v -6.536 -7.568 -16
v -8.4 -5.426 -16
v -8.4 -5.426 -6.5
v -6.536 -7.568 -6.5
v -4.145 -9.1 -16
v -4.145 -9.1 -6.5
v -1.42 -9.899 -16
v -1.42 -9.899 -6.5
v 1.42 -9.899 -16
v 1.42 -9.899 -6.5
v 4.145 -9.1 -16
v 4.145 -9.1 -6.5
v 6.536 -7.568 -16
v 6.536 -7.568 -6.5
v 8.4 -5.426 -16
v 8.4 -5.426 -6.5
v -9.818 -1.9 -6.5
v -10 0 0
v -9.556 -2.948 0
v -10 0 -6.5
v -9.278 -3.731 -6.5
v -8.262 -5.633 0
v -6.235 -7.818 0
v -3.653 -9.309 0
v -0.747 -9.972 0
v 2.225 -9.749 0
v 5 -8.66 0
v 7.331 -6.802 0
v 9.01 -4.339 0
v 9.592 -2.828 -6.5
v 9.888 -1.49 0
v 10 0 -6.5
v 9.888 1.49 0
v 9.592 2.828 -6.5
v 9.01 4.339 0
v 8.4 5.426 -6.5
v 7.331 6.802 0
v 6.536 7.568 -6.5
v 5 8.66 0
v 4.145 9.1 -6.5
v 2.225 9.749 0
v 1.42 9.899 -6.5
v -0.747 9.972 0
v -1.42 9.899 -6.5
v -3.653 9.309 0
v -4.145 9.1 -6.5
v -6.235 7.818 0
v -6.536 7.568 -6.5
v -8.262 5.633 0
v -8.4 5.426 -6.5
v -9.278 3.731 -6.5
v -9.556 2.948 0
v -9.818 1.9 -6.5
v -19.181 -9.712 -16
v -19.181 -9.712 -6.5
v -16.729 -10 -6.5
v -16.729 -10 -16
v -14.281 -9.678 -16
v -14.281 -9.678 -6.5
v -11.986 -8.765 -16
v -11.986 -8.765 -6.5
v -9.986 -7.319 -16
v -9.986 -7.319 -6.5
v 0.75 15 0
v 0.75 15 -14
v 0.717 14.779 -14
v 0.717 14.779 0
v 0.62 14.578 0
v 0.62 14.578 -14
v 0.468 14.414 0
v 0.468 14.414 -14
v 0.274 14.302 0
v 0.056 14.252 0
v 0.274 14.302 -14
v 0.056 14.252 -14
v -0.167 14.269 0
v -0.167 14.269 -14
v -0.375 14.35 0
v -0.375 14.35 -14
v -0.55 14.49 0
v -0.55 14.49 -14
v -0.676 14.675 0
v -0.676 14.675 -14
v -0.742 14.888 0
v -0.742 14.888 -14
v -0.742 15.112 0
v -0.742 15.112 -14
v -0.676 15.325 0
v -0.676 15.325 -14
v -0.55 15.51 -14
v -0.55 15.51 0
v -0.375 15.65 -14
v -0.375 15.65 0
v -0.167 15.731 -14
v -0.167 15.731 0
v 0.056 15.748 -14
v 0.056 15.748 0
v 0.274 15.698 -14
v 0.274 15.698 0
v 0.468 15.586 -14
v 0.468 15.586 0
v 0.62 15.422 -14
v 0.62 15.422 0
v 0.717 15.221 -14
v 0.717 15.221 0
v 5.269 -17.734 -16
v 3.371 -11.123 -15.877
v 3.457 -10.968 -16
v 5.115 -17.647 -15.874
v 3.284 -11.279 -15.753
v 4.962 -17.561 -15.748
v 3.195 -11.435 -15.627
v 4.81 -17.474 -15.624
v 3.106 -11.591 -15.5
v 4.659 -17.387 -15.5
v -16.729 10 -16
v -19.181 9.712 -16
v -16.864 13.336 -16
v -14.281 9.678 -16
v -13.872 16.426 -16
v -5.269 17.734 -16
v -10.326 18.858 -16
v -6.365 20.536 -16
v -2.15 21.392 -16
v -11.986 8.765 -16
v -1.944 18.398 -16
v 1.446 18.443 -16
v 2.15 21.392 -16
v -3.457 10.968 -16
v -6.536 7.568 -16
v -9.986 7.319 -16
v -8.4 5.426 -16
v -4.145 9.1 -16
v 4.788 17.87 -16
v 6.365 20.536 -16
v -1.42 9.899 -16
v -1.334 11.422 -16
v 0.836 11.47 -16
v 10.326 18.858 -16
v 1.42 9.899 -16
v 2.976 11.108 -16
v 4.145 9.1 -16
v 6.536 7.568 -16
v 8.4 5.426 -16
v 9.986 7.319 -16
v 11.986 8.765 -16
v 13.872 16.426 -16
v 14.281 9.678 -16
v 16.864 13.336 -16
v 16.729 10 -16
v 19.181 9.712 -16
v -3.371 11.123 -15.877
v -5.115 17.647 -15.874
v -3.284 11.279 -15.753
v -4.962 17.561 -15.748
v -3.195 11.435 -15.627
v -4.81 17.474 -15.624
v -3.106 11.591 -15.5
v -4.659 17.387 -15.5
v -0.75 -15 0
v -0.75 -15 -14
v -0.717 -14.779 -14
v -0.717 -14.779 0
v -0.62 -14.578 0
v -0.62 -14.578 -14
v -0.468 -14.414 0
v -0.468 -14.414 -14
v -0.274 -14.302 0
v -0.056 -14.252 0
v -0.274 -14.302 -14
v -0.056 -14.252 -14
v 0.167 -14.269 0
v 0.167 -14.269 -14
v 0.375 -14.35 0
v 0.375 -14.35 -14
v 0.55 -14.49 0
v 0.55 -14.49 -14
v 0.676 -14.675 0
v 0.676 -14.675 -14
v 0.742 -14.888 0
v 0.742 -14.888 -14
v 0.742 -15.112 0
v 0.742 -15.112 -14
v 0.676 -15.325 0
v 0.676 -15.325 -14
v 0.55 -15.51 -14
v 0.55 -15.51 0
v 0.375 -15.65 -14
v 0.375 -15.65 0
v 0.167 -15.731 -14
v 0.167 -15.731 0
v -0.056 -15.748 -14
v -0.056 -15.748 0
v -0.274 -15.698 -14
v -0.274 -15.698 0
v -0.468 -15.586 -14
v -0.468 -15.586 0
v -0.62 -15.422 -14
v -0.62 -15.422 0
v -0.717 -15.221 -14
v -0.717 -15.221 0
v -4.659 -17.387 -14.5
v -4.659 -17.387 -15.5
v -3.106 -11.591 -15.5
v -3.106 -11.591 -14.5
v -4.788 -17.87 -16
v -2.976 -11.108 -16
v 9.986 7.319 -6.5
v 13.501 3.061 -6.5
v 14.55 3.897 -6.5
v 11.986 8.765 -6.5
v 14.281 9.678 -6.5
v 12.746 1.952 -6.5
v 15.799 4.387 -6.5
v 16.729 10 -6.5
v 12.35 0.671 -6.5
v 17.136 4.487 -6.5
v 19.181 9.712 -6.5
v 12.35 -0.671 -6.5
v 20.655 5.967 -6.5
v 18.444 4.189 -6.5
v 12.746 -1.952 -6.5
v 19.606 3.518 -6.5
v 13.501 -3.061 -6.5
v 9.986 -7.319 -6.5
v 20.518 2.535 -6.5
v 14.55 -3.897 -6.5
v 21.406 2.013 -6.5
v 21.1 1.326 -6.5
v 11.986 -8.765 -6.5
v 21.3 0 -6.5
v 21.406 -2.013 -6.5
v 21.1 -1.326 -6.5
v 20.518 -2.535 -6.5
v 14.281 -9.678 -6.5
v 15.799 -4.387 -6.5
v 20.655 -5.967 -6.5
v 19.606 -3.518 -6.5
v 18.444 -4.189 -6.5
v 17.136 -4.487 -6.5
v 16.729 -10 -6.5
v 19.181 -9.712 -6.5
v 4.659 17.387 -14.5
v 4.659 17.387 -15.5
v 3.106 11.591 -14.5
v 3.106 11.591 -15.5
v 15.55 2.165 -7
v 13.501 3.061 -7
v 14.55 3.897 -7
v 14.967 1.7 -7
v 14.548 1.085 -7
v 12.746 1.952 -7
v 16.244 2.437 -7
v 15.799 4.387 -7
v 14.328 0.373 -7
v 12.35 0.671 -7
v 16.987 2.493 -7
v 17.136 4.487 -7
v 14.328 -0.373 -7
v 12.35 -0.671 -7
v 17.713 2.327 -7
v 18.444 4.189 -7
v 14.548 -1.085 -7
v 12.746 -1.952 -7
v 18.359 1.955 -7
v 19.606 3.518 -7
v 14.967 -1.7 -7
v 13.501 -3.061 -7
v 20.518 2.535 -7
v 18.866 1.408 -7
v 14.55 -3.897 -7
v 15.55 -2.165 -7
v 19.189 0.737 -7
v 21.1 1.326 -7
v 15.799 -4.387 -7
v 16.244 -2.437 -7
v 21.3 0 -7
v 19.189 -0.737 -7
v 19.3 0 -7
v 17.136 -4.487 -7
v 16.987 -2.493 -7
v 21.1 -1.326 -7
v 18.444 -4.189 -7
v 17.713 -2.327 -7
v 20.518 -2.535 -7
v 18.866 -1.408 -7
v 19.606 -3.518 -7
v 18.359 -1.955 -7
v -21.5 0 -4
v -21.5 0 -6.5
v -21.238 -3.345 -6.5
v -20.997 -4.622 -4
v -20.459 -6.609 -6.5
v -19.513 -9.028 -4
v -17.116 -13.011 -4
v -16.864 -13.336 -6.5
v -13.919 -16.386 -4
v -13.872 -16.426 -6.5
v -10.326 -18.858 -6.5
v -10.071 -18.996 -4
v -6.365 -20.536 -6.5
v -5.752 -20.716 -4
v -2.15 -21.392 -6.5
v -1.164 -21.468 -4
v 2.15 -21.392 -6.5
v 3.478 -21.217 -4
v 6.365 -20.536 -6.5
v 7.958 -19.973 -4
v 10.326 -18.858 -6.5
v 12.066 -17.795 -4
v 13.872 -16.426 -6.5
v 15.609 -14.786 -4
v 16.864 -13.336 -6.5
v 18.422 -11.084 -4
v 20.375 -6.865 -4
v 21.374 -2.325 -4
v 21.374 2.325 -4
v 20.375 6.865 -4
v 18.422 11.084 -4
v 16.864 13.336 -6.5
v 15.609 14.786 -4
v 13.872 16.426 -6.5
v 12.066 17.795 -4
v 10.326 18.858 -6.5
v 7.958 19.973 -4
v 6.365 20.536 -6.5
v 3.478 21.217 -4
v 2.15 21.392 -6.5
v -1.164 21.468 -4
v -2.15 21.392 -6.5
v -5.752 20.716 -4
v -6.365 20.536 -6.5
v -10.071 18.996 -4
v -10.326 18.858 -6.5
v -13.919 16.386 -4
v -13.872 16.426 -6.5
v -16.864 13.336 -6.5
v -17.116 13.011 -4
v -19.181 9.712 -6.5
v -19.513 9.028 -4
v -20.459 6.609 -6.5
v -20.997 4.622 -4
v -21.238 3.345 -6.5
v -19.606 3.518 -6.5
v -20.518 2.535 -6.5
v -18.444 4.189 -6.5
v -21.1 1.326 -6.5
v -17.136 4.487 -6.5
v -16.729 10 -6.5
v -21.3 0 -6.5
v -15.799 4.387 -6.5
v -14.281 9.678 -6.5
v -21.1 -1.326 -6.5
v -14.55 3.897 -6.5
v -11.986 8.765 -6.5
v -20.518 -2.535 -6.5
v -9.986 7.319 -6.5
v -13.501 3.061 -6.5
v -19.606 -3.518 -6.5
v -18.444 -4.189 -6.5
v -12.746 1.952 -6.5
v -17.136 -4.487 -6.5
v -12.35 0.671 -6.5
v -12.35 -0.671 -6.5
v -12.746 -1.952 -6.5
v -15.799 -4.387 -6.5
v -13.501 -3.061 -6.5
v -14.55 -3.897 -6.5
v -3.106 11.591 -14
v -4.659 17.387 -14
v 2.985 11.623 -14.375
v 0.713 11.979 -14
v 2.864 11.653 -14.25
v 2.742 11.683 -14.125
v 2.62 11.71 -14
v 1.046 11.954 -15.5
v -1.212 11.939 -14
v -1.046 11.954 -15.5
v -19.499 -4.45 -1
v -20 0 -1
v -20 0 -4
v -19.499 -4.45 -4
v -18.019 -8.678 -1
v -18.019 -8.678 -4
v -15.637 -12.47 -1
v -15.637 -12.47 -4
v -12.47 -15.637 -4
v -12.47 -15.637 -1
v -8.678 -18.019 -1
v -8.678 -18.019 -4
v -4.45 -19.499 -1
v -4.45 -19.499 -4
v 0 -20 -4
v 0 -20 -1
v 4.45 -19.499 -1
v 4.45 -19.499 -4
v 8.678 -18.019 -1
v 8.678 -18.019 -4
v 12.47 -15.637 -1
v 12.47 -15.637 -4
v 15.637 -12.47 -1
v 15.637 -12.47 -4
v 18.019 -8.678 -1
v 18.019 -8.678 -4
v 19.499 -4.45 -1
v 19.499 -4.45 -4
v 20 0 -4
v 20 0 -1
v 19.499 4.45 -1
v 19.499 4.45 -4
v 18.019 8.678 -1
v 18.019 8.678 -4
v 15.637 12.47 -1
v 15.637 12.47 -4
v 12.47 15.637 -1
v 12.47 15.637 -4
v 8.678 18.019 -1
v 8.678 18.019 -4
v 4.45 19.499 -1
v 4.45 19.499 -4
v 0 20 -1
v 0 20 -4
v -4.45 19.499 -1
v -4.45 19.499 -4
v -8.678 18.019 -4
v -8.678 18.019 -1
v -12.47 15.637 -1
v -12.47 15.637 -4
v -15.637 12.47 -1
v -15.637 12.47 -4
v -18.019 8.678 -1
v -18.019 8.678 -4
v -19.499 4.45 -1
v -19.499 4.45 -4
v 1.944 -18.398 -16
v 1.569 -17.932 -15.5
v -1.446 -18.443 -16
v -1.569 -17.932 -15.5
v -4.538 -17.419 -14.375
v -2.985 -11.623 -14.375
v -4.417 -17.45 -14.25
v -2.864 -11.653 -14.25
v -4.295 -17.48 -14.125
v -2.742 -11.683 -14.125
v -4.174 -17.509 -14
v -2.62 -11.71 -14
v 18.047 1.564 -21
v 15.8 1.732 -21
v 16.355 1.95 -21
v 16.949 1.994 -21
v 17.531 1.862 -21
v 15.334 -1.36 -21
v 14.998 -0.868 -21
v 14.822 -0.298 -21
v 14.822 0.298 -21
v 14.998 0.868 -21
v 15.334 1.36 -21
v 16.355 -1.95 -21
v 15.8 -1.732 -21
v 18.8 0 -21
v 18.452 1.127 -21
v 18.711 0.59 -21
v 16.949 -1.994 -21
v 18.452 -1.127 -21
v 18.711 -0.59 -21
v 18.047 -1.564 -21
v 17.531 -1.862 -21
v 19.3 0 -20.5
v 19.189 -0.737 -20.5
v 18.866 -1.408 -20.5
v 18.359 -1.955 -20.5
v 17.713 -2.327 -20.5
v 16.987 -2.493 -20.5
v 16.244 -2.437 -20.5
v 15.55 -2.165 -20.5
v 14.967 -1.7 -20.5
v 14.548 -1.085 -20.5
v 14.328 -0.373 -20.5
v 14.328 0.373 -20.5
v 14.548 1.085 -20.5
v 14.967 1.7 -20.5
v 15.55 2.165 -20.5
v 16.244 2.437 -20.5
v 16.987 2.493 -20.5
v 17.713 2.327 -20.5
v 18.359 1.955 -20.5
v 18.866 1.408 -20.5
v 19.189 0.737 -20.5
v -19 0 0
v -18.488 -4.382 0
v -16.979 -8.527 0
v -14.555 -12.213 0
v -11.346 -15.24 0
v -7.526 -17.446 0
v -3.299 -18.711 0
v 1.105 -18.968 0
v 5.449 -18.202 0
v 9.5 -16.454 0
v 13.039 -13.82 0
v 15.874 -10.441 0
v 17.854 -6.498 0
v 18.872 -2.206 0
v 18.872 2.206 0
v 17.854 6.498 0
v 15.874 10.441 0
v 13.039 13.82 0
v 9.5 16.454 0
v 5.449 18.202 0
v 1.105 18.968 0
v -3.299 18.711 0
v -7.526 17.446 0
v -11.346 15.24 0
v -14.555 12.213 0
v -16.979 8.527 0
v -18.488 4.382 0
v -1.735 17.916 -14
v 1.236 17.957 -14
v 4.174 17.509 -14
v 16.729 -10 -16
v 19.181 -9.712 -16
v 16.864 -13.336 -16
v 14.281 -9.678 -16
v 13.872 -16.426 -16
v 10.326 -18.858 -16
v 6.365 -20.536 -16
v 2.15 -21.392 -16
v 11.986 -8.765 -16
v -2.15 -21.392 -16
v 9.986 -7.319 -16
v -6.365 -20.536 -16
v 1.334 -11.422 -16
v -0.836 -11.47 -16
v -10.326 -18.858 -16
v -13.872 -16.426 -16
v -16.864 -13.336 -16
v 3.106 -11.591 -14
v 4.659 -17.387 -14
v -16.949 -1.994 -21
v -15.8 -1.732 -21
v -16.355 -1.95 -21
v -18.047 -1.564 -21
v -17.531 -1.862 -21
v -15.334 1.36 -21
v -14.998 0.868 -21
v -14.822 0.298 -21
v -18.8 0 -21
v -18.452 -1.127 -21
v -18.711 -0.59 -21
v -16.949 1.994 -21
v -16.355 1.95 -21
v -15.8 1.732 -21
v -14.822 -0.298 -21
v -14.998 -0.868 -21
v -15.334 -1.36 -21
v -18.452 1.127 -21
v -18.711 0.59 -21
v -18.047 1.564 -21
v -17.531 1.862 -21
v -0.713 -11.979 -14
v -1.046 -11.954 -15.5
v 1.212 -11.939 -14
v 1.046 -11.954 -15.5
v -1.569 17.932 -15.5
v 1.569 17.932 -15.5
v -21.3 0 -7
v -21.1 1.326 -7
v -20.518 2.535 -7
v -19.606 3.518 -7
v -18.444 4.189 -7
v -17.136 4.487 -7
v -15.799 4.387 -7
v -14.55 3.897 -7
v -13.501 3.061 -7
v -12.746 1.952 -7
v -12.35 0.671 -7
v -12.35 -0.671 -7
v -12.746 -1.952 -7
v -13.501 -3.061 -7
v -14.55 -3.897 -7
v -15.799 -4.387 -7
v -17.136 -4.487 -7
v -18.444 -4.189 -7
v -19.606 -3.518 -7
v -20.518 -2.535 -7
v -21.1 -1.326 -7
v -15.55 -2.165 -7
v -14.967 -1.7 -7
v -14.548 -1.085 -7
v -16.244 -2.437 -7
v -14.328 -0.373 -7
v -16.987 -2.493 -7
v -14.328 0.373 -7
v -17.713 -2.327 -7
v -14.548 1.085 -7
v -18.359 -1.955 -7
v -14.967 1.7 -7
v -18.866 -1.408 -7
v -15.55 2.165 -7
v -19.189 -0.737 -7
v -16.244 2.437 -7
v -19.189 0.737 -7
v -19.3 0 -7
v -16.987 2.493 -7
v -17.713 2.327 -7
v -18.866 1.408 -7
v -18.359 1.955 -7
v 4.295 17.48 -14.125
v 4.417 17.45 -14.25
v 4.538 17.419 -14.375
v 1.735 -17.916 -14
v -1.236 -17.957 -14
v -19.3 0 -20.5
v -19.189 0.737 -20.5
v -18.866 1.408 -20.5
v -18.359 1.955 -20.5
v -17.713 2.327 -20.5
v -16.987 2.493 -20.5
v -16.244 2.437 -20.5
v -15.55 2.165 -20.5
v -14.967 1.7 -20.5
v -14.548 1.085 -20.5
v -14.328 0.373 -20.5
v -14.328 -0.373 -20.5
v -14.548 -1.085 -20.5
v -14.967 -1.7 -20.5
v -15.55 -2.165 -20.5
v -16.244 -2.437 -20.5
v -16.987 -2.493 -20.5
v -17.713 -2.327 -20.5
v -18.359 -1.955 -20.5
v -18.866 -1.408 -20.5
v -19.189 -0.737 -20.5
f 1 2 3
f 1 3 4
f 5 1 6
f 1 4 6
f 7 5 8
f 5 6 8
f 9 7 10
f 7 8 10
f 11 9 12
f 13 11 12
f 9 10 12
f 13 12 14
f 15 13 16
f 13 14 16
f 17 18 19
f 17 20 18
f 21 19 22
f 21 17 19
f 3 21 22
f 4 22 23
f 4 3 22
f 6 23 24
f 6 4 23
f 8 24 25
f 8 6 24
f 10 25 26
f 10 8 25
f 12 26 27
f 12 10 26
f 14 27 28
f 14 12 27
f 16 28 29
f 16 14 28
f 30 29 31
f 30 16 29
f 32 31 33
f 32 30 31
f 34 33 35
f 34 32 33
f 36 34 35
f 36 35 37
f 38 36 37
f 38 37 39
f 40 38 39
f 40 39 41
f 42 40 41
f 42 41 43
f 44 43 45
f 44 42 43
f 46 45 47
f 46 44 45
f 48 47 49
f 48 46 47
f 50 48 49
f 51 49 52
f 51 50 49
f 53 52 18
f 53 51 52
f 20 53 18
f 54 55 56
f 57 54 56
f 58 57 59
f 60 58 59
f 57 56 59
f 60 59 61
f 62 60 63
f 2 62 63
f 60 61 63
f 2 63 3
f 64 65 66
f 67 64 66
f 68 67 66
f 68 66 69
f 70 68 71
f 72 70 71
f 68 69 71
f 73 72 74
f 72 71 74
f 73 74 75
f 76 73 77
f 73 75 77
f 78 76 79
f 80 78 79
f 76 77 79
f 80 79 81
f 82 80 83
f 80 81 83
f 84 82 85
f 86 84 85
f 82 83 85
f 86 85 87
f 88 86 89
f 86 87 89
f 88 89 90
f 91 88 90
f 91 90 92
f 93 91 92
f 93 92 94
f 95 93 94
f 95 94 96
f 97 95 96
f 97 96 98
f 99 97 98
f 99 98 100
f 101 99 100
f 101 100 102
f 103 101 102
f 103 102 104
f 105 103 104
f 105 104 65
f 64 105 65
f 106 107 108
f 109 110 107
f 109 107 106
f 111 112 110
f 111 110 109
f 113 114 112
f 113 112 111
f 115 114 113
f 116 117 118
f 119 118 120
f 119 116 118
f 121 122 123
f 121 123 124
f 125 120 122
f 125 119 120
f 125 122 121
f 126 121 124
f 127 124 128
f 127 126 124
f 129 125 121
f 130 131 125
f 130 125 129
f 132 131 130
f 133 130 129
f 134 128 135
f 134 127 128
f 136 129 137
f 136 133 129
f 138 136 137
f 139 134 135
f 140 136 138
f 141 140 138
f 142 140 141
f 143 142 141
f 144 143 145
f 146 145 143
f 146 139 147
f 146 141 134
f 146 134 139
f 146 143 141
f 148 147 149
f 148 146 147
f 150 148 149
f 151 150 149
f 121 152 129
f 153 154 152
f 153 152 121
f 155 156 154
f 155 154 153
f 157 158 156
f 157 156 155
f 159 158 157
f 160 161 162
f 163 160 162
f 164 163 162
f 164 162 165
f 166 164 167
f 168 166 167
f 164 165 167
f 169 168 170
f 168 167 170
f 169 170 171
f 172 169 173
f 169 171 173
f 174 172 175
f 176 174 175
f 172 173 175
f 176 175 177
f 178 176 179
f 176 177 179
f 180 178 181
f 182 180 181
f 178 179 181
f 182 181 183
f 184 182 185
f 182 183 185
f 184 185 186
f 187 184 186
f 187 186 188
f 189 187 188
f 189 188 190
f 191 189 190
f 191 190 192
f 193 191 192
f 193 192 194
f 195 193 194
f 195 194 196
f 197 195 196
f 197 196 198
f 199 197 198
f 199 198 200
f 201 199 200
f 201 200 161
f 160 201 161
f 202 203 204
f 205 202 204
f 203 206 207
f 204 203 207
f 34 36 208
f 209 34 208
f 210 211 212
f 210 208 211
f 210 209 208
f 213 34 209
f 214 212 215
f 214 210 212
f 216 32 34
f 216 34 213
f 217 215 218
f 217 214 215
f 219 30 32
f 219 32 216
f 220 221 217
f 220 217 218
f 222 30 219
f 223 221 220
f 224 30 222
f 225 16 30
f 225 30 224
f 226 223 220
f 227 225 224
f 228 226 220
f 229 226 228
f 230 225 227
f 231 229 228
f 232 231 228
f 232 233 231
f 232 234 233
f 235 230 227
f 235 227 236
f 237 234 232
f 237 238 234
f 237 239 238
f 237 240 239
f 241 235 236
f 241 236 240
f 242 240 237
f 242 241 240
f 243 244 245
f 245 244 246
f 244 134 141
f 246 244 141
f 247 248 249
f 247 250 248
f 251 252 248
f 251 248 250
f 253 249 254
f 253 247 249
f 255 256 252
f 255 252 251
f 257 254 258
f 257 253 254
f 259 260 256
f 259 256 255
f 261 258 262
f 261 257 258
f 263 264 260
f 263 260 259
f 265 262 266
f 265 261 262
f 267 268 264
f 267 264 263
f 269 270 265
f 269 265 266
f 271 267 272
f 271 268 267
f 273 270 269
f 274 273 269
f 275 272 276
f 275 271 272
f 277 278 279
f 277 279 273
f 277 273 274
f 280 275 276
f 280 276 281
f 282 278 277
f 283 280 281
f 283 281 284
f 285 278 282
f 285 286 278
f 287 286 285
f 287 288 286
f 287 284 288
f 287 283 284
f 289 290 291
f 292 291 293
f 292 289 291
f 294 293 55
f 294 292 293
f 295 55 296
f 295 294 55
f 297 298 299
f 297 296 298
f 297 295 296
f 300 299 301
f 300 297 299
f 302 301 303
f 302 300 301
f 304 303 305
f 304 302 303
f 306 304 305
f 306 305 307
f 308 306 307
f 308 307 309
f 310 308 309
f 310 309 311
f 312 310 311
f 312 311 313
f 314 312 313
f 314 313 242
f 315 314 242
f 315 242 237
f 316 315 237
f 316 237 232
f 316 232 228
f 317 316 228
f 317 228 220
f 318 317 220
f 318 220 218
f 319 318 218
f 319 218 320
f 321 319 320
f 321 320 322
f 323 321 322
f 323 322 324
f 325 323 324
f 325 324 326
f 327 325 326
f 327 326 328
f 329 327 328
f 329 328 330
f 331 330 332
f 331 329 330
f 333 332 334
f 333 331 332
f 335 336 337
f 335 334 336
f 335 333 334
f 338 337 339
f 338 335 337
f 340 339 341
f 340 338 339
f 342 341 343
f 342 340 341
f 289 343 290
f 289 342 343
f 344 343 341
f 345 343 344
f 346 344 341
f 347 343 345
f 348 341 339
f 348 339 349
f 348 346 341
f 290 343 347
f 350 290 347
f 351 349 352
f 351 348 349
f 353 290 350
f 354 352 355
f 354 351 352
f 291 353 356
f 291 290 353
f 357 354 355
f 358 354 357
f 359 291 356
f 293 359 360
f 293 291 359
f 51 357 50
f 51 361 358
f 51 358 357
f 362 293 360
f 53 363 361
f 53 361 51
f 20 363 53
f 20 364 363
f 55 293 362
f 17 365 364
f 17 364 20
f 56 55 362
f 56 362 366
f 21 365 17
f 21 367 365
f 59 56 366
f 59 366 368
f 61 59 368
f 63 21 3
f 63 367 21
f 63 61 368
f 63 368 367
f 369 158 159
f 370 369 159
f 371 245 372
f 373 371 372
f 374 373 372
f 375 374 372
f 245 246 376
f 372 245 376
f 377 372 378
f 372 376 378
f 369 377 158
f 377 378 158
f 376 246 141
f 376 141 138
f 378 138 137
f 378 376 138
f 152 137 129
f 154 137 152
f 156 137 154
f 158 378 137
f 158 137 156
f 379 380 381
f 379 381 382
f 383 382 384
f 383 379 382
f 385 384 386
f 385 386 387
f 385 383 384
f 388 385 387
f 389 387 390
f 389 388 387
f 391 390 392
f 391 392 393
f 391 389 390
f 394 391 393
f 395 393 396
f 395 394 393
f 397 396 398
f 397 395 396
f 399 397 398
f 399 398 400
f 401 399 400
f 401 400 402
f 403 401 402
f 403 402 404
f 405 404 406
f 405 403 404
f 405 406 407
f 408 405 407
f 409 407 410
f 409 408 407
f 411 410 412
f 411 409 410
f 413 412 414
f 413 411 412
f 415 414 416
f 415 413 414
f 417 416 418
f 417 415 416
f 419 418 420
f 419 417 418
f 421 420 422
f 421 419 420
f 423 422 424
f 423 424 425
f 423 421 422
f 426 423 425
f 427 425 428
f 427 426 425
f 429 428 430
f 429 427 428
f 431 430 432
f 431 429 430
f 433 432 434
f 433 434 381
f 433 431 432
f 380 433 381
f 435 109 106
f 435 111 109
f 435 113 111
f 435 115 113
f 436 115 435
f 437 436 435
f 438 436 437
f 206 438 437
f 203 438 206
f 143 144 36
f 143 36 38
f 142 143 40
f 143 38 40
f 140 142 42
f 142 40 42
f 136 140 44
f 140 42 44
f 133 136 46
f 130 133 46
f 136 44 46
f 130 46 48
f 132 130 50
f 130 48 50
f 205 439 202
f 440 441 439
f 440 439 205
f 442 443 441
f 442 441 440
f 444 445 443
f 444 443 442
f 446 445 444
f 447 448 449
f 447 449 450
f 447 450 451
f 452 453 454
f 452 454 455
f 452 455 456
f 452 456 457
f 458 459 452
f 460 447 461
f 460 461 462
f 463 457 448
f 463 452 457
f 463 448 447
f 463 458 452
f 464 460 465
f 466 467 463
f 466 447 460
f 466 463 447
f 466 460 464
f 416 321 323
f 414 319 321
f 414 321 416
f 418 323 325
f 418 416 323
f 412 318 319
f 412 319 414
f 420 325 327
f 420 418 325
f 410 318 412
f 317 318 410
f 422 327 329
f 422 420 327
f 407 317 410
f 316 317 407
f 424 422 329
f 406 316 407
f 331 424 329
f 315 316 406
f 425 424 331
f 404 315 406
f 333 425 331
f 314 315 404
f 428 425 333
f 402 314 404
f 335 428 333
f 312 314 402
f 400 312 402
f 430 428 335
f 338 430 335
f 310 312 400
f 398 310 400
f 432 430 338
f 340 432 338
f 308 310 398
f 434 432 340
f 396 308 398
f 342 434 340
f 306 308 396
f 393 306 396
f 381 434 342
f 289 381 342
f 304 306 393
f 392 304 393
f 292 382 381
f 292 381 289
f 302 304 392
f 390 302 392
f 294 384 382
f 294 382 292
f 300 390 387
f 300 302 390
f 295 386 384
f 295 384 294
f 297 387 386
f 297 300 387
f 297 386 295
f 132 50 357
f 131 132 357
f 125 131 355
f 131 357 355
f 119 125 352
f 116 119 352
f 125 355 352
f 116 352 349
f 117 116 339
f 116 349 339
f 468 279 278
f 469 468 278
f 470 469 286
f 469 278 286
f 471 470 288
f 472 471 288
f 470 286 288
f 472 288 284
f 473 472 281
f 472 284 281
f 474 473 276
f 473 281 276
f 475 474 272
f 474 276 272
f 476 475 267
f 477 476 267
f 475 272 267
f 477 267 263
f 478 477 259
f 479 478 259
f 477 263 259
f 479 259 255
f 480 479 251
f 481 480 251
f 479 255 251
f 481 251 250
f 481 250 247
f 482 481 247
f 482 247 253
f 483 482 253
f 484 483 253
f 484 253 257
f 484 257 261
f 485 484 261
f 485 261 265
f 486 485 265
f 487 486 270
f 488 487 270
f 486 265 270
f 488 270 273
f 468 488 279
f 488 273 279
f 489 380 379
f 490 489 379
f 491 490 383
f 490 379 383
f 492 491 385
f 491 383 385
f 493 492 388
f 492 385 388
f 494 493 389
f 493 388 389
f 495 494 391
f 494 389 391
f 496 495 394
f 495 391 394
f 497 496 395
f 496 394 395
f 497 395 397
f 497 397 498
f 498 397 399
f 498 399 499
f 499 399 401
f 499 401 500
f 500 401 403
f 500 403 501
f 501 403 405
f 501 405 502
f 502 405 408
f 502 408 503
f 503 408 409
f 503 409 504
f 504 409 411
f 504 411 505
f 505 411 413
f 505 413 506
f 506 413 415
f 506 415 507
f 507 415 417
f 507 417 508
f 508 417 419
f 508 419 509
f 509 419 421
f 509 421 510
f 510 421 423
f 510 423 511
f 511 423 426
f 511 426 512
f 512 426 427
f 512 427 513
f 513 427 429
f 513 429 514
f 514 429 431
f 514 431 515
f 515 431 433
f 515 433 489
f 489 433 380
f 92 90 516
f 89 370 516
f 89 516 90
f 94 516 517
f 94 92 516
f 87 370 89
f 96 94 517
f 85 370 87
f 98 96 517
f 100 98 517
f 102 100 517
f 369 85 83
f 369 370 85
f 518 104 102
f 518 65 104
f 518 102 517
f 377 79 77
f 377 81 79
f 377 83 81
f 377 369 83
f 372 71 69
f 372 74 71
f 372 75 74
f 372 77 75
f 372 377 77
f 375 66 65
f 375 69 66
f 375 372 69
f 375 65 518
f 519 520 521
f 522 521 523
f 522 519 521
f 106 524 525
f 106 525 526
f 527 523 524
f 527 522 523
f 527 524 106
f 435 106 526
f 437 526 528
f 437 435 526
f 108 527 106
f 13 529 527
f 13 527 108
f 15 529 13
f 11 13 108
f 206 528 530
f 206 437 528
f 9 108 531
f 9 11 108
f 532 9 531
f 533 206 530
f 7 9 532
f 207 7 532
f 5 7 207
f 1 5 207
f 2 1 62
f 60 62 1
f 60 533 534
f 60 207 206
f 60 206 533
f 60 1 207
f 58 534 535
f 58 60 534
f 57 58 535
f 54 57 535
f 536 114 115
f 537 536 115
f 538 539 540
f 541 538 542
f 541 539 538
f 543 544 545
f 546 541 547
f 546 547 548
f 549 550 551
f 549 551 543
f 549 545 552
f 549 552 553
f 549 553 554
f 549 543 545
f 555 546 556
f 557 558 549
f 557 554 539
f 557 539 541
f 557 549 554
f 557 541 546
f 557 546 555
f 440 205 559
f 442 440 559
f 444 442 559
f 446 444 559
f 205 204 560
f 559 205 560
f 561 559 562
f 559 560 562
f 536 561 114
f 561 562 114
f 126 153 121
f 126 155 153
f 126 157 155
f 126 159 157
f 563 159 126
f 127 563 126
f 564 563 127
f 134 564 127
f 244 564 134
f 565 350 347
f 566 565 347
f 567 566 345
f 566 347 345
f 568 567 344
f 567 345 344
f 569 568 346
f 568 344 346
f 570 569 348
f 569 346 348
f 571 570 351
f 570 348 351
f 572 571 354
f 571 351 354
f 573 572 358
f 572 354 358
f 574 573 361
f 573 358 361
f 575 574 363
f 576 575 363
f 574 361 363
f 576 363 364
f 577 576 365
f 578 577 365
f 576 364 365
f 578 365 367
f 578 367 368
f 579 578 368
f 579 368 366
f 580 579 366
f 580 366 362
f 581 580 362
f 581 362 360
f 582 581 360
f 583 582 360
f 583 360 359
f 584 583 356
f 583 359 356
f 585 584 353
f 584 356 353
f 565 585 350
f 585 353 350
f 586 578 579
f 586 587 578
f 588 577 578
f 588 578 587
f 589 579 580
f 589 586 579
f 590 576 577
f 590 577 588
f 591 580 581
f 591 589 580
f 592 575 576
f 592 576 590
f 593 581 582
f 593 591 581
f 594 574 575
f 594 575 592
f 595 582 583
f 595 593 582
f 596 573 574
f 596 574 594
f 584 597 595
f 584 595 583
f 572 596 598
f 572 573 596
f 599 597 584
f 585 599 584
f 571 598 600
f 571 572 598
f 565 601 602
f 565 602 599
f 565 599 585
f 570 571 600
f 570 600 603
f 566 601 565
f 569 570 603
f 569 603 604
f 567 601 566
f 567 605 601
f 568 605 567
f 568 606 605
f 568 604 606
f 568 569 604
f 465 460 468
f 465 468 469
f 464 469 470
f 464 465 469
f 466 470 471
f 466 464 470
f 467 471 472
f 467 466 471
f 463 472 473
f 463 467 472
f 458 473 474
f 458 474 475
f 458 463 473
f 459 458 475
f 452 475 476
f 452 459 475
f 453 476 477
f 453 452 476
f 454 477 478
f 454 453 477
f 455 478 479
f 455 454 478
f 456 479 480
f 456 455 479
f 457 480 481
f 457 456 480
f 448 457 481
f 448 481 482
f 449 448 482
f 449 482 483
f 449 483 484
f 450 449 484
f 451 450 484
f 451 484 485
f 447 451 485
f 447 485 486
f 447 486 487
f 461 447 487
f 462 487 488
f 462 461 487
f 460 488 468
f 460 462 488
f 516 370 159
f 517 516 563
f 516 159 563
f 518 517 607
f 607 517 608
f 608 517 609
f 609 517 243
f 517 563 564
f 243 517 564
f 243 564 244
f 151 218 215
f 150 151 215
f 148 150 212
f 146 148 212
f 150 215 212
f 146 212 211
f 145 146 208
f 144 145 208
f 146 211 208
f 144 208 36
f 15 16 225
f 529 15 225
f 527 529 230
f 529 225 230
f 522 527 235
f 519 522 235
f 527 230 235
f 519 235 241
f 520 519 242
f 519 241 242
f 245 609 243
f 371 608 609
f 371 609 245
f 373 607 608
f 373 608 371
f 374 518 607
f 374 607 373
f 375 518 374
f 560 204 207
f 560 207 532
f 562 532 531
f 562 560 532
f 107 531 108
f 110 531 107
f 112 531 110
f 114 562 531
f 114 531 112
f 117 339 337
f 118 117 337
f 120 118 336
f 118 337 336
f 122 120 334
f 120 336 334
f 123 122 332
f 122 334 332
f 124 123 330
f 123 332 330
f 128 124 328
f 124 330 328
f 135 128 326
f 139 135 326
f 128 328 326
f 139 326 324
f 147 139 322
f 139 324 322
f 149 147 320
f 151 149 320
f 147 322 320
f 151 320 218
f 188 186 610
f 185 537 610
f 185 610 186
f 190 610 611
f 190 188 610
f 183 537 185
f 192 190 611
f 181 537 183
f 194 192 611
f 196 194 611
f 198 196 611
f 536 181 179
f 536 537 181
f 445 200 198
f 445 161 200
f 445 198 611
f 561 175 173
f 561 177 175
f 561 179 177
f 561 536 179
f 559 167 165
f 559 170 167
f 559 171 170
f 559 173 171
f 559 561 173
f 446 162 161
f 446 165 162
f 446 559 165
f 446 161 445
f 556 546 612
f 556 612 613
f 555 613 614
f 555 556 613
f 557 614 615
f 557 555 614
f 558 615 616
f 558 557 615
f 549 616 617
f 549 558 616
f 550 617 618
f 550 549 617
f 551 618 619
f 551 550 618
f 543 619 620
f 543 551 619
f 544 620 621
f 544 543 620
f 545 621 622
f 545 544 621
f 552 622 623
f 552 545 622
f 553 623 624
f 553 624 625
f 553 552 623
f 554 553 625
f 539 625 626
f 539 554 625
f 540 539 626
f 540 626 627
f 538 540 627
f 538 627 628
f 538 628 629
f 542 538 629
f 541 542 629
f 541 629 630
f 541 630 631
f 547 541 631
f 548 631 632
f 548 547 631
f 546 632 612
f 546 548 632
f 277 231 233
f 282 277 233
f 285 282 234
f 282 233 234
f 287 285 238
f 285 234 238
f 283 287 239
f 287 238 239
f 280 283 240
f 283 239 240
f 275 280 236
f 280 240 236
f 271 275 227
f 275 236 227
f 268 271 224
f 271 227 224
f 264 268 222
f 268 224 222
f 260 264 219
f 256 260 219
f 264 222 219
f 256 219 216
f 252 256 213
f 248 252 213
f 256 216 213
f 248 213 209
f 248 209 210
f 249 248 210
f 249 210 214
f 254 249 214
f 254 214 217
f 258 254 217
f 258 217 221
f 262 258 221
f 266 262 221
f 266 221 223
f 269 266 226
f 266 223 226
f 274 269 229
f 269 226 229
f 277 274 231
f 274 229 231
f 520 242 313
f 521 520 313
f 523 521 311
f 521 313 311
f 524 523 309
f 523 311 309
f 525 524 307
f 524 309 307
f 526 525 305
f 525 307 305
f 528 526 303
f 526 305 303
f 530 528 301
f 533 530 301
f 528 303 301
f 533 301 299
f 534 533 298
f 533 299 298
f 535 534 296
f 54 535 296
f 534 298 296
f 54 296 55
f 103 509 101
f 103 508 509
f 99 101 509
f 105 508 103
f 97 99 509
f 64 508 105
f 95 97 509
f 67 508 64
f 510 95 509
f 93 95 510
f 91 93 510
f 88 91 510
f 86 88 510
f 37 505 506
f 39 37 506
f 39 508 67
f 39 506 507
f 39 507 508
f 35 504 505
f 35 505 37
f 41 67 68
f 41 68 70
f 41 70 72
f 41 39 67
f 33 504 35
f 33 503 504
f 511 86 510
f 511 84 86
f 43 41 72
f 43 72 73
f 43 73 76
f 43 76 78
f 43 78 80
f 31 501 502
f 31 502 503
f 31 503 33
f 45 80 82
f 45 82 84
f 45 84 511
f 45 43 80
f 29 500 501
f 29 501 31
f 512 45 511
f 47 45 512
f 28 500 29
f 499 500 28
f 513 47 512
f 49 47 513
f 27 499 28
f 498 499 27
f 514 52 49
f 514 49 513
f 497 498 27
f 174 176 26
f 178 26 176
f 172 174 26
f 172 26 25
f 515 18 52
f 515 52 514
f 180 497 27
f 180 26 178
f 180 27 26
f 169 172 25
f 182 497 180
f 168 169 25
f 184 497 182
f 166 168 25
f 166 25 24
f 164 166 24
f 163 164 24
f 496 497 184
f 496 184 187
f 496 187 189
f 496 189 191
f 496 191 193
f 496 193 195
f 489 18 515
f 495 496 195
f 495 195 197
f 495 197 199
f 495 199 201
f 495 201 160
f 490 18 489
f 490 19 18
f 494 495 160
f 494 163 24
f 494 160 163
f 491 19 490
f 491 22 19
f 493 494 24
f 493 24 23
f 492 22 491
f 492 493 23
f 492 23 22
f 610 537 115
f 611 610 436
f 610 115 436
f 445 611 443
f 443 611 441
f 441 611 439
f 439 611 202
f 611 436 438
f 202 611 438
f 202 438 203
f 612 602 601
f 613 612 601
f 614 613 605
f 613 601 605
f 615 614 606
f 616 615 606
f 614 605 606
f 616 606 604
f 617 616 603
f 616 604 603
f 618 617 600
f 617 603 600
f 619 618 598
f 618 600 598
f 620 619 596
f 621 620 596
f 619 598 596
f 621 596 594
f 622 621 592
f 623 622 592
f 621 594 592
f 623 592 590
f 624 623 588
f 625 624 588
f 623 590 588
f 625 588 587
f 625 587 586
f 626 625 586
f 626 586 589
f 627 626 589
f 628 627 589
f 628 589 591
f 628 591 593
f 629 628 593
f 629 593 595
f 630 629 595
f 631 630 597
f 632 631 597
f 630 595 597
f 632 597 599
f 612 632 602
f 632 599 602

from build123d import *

# Parameters (mm, degrees)
CHAMFER1_SIZE                = 1
SKETCH3_R                    = 4.5
BOSS_EXTRUDE2_DEPTH          = 0.5
SKETCH4_R                    = 2.5
BOSS_EXTRUDE3_DEPTH          = 14
CHAMFER2_SIZE                = 0.5
CIRPATTERN1_COUNT            = 2
CHAMFER2_OF_CIRPATTERN1_SIZE = 0.5
BOSS_EXTRUDE4_DEPTH          = 9.5
SKETCH6_R                    = 0.75
CUT_EXTRUDE2_DEPTH           = 2
SKETCH6_3_R                  = 0.75
CUT_EXTRUDE3_DEPTH           = 35.358405085
CHAMFER3_SIZE                = 0.5
CIRPATTERN2_COUNT            = 2
CHAMFER3_OF_CIRPATTERN2_SIZE = 0.5


with BuildPart() as part:
    # Sketch1 → Revolve1 (revolve)
    with BuildSketch(Plane(origin=(0, 0, 0), x_dir=(0, 0, -1), z_dir=(1, 0, 0)), mode=Mode.PRIVATE) as revolve1_sk:
        Polygon((0, 20), (0, 10), (6.5, 10), (6.5, 13.235638921), (6.5, 20.468347011), (6.5, 21.5), (4, 21.5), (4, 20), align=None)
    revolve(revolve1_sk.sketch.rotate(Axis((0, 0, 0), (0, 0, 1)), 90), axis=Axis((0, 0, 0), (0, 0, 1)))

    # Chamfer1
    chamfer1_edges = [part.edges().sort_by_distance(p)[0] for p in [
        (20, 0, 0),
    ]]
    chamfer(chamfer1_edges, length=CHAMFER1_SIZE)

    # Sketch3 → Boss-Extrude2 (add)
    with BuildSketch(Plane(origin=(0, 0, -6.5), x_dir=(-1, 0, 0), z_dir=(0, 0, -1))):
        with Locations((16.8, 0)):
            Circle(SKETCH3_R)
    boss_extrude2 = extrude(amount=BOSS_EXTRUDE2_DEPTH)

    # Sketch4 → Boss-Extrude3 (add)
    with BuildSketch(Plane(origin=(0, 0, -7), x_dir=(-1, 0, 0), z_dir=(0, 0, -1))):
        with Locations((16.8, 0)):
            Circle(SKETCH4_R)
    boss_extrude3 = extrude(amount=BOSS_EXTRUDE3_DEPTH)

    # Chamfer2
    chamfer2_edges = [part.edges().sort_by_distance(p)[0] for p in [
        (-14.3, 0, -21),
    ]]
    chamfer(chamfer2_edges, length=CHAMFER2_SIZE)

    # CirPattern1: Boss-Extrude2, Boss-Extrude3 ×2 about axis
    cirpattern1_axis = Axis((0, 0, 0), (0, 0, 1))
    add([boss_extrude2.rotate(cirpattern1_axis, i * 360 / CIRPATTERN1_COUNT) for i in range(1, CIRPATTERN1_COUNT)])
    add([boss_extrude3.rotate(cirpattern1_axis, i * 360 / CIRPATTERN1_COUNT) for i in range(1, CIRPATTERN1_COUNT)])

    # Chamfer2 of CirPattern1
    chamfer2_of_cirpattern1_edges = [part.edges().sort_by_distance(p)[0] for p in [
        (14.3, 0, -21),
    ]]
    chamfer(chamfer2_of_cirpattern1_edges, length=CHAMFER2_OF_CIRPATTERN1_SIZE)

    # Sketch5 → Boss-Extrude4 (add)
    with BuildSketch(Plane(origin=(0, 0, -6.5), x_dir=(-1, 0, 0), z_dir=(0, 0, -1))):
        with BuildLine():
            ThreePointArc((-8.4, -5.425863987), (-13.105433977, -9.292479858), (-19.18125, -9.712345156))
            ThreePointArc((-19.18125, -9.712345156), (0, -21.5), (19.18125, -9.712345156))
            ThreePointArc((19.18125, -9.712345156), (13.105433977, -9.292479858), (8.4, -5.425863987))
            ThreePointArc((8.4, -5.425863987), (0, -10), (-8.4, -5.425863987))
        make_face()
    boss_extrude4 = extrude(amount=BOSS_EXTRUDE4_DEPTH)

    # Sketch6 → Cut-Extrude2 (cut)
    # profile 1 of 2: a face of its own
    with BuildSketch(Plane(origin=(0, 0, -16), x_dir=(-1, 0, 0), z_dir=(0, 0, -1))):
        with BuildLine():
            ThreePointArc((3.105828541, -11.591109915), (0, -12), (-3.105828541, -11.591109915))
            Line((-3.105828541, -11.591109915), (-4.658742812, -17.386664873))
            ThreePointArc((-4.658742812, -17.386664873), (0, -18), (4.658742812, -17.386664873))
            Line((4.658742812, -17.386664873), (3.105828541, -11.591109915))
        make_face()
        with Locations((0, -15)):
            Circle(SKETCH6_R, mode=Mode.SUBTRACT)
    # profile 2 of 2: a face of its own
    with BuildSketch(Plane(origin=(0, 0, -16), x_dir=(-1, 0, 0), z_dir=(0, 0, -1))):
        with Locations((0, -15)):
            Circle(SKETCH6_R)
    cut_extrude2 = extrude(amount=-CUT_EXTRUDE2_DEPTH, mode=Mode.SUBTRACT)

    # Sketch6<3> → Cut-Extrude3 (cut, through all)
    with BuildSketch(Plane(origin=(0, 0, -16), x_dir=(-1, 0, 0), z_dir=(0, 0, -1))):
        with Locations((0, -15)):
            Circle(SKETCH6_3_R)
    cut_extrude3 = extrude(amount=-CUT_EXTRUDE3_DEPTH, mode=Mode.SUBTRACT)

    # Chamfer3
    chamfer3_edges = [part.edges().sort_by_distance(p)[0] for p in [
        (0, -12, -16),
        (-3.882285677, -14.488887394, -14),
        (3.882285677, -14.488887394, -16),
        (0, -18, -16),
    ]]
    chamfer(chamfer3_edges, length=CHAMFER3_SIZE)

    # CirPattern2: Boss-Extrude4, Cut-Extrude2, Cut-Extrude3 ×2 about axis
    cirpattern2_axis = Axis((0, 0, 0), (0, 0, 1))
    add([boss_extrude4.rotate(cirpattern2_axis, i * 360 / CIRPATTERN2_COUNT) for i in range(1, CIRPATTERN2_COUNT)])
    add([cut_extrude2.rotate(cirpattern2_axis, i * 360 / CIRPATTERN2_COUNT) for i in range(1, CIRPATTERN2_COUNT)], mode=Mode.SUBTRACT)
    add([cut_extrude3.rotate(cirpattern2_axis, i * 360 / CIRPATTERN2_COUNT) for i in range(1, CIRPATTERN2_COUNT)], mode=Mode.SUBTRACT)

    # Chamfer3 of CirPattern2
    chamfer3_of_cirpattern2_edges = [part.edges().sort_by_distance(p)[0] for p in [
        (0, 12, -16),
        (3.882285677, 14.488887394, -14),
        (-3.882285677, 14.488887394, -16),
        (0, 18, -16),
    ]]
    chamfer(chamfer3_of_cirpattern2_edges, length=CHAMFER3_OF_CIRPATTERN2_SIZE)


solid = part.part
